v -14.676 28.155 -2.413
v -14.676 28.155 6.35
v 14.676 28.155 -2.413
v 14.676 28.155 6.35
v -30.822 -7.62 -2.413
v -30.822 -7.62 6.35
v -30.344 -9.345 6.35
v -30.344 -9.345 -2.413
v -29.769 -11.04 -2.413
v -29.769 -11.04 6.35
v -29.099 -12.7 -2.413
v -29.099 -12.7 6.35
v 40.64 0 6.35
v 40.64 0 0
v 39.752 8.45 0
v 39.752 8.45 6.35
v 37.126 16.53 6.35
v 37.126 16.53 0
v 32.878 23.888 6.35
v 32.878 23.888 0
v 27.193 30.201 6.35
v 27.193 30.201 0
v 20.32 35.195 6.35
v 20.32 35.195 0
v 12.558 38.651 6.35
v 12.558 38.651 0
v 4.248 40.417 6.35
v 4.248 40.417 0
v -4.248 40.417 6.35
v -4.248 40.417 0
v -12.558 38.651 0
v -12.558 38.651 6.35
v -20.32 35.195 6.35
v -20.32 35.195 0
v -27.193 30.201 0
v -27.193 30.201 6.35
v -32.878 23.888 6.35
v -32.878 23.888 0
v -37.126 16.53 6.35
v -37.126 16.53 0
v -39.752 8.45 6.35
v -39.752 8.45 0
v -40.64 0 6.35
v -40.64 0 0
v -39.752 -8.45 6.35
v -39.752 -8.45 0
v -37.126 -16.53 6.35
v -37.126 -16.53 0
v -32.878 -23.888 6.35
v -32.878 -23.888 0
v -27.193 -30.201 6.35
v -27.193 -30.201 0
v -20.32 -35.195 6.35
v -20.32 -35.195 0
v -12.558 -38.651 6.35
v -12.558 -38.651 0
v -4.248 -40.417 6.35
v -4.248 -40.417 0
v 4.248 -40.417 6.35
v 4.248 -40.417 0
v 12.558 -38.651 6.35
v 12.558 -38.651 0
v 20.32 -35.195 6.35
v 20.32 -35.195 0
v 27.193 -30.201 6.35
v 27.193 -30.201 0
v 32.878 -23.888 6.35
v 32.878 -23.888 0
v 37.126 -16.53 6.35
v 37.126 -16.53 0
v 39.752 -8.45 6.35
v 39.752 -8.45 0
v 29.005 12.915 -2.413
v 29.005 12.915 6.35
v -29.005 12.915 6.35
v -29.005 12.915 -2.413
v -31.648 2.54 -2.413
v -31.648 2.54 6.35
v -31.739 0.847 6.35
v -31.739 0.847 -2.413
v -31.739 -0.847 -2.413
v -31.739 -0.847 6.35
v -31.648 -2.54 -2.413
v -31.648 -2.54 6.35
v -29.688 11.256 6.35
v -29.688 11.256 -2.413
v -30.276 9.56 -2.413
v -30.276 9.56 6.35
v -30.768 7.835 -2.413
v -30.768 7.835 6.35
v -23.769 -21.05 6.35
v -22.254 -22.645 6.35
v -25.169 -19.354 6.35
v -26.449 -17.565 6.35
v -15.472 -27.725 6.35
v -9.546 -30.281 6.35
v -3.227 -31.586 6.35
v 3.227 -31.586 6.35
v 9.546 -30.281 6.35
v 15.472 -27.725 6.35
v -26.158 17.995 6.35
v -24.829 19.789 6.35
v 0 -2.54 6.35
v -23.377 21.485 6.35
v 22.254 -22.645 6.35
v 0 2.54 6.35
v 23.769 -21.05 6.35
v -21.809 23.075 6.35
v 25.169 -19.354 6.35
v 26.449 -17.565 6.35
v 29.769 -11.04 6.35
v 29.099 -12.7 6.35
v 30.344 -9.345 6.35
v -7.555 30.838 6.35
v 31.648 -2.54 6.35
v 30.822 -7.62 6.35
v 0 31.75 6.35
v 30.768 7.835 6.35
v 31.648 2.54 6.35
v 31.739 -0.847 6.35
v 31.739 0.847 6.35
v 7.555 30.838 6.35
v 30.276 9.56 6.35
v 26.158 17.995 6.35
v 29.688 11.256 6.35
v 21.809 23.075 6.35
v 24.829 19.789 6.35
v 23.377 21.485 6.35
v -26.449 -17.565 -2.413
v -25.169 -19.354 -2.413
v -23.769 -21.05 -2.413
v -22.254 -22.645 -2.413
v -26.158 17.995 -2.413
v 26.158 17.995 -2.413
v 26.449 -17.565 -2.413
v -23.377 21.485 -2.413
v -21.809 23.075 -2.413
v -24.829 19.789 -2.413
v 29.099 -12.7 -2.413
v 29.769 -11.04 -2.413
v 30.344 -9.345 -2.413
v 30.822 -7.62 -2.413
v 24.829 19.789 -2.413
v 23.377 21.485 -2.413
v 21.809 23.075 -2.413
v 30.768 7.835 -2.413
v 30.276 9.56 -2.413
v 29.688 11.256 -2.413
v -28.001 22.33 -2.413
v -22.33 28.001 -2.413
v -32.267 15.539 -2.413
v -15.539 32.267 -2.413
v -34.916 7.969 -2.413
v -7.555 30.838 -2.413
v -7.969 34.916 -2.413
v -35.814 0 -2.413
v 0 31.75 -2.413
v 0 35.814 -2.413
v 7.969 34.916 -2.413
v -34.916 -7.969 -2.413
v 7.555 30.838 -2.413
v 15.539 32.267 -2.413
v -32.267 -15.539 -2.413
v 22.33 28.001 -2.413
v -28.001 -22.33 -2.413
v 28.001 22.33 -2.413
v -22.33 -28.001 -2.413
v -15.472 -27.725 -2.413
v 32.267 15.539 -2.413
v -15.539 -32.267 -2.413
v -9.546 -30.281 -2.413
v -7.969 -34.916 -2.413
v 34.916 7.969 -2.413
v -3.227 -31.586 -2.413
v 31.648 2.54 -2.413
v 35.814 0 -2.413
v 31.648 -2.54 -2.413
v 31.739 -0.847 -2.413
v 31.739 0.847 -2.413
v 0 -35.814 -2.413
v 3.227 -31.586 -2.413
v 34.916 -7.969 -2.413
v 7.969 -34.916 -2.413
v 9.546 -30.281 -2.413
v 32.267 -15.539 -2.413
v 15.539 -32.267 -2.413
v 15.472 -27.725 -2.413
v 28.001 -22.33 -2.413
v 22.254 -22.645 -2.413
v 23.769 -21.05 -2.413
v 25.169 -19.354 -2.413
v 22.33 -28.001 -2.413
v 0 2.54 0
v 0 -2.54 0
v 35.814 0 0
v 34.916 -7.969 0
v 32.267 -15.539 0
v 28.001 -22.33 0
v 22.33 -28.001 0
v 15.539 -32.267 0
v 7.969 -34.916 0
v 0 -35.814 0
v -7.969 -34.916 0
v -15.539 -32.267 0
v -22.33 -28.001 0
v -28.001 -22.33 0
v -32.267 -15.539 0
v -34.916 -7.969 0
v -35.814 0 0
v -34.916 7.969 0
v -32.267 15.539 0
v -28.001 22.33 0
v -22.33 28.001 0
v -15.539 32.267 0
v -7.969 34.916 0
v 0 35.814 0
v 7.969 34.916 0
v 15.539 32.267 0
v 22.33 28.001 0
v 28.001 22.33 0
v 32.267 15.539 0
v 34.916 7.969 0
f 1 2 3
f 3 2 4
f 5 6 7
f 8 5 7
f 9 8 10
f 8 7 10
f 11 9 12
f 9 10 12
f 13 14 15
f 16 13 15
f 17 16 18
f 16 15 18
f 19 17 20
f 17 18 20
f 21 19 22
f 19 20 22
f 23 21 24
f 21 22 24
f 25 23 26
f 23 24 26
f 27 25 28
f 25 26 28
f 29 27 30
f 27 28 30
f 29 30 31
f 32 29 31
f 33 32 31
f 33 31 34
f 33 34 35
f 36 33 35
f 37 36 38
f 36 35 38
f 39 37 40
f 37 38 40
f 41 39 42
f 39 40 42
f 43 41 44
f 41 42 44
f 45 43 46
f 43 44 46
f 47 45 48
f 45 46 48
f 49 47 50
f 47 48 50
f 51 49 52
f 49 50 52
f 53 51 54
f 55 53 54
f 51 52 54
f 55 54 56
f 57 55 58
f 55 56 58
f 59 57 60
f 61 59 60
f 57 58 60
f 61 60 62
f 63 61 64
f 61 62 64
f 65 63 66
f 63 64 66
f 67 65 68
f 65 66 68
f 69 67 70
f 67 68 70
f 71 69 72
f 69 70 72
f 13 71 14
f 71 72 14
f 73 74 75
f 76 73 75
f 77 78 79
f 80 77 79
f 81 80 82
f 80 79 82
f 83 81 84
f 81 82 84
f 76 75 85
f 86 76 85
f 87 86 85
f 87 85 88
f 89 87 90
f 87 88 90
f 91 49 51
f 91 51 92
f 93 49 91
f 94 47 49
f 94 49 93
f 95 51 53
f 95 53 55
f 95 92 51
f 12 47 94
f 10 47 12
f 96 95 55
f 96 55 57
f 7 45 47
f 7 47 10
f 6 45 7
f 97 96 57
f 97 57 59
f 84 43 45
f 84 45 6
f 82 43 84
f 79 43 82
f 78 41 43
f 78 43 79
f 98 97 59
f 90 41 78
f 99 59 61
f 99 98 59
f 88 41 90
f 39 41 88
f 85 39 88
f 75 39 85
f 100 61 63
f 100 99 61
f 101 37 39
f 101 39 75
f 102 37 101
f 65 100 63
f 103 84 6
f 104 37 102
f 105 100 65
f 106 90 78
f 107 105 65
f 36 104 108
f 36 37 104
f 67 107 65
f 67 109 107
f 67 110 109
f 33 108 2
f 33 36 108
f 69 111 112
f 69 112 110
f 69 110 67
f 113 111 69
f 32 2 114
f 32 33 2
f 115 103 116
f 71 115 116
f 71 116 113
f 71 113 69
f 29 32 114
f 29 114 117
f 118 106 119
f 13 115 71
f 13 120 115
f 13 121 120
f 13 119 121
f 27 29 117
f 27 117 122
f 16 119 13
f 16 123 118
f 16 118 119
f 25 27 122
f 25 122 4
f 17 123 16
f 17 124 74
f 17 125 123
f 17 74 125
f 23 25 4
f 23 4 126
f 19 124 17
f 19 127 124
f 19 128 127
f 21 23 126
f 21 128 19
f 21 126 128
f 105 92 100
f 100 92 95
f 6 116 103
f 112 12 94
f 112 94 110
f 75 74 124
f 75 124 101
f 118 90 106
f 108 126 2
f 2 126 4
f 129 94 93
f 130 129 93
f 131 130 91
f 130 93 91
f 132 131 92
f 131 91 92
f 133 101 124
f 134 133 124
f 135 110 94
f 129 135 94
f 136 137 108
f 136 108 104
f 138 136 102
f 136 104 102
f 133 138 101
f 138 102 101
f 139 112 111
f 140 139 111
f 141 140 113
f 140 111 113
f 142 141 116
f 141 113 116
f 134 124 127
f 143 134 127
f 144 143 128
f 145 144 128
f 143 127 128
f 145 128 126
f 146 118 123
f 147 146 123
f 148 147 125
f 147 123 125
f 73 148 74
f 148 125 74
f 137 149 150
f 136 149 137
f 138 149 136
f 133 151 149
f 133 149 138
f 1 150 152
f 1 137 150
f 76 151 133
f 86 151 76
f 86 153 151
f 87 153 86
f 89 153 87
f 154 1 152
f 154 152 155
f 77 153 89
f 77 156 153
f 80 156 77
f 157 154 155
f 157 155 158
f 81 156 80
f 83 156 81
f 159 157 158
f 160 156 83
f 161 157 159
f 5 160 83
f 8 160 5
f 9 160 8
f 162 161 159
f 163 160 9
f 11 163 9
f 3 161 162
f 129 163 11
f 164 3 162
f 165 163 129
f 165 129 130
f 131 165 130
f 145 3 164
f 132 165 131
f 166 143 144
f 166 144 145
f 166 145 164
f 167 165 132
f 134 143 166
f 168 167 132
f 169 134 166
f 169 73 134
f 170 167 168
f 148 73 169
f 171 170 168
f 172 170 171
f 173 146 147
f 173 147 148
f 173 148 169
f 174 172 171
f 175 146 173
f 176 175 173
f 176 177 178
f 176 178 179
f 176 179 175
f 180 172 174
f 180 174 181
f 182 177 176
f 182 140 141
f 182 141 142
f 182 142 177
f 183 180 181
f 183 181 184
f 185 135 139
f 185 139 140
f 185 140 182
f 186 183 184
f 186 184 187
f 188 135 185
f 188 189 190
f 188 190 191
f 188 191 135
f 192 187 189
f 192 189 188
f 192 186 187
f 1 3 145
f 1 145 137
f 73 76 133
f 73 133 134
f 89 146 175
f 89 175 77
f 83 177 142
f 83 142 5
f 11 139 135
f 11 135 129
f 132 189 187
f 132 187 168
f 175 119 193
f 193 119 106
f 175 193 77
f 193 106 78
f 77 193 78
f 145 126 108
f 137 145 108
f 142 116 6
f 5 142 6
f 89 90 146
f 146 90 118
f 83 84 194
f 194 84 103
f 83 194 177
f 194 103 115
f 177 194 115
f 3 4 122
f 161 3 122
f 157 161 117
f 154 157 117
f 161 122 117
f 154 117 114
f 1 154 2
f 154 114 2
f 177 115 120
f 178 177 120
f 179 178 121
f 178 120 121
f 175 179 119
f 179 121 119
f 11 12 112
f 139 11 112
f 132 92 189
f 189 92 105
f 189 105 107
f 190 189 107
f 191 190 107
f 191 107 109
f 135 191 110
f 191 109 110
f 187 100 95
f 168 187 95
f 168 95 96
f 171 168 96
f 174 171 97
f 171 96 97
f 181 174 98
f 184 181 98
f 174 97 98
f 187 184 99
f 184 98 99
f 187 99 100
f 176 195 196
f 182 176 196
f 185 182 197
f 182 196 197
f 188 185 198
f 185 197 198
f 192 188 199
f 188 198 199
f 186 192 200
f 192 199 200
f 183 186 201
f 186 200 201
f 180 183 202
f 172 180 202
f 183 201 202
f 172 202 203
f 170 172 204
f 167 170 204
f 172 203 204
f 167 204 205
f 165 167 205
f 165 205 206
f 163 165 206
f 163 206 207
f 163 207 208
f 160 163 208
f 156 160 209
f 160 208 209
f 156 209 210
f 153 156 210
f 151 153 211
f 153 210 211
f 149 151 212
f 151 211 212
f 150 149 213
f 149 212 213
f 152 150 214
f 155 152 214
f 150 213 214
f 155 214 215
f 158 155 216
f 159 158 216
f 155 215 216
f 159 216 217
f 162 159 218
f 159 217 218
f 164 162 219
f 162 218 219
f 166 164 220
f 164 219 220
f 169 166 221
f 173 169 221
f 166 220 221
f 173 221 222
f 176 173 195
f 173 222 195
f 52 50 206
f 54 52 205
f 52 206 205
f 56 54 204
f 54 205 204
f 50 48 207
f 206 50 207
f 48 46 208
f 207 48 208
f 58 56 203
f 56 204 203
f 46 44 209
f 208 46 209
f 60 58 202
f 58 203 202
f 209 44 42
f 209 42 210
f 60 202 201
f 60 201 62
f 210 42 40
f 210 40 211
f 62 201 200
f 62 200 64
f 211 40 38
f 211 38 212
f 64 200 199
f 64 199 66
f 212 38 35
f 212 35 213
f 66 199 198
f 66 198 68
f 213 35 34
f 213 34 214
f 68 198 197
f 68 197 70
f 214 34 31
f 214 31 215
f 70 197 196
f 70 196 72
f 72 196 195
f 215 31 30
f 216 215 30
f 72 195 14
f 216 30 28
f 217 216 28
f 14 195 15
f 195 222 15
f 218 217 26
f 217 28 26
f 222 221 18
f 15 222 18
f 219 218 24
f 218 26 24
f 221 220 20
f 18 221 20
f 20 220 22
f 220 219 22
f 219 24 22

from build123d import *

# Parameters (mm, degrees)
F0_R     = 40.64
F0_R_2   = 2.54
F1_DEPTH = 6.35
F3_R     = 35.814
F4_DEPTH = 2.413
F5_DEPTH = 8.764


with BuildPart() as f1:
    # F0 (on Top) → F1 (new body)
    with BuildSketch(Plane.XY):
        Circle(F0_R)
        Circle(F0_R_2, mode=Mode.SUBTRACT)
    extrude(amount=F1_DEPTH)

    # F3 (on face) → F4 (join)
    with BuildSketch(Plane(origin=(0, 0, 0), x_dir=(1, 0, 0), z_dir=(0, 0, -1))):
        Circle(F3_R)
    extrude(amount=F4_DEPTH)

    # F2 (on face) → F5 (cut, through all)
    with BuildSketch(Plane.XY.offset(6.35)):
        with BuildLine():
            Line((-26.1582, 17.994751), (26.1582, 17.994751))
            ThreePointArc((26.1582, 17.994751), (24.117564, 20.649591), (21.808676, 23.074751))
            Line((21.808676, 23.074751), (-21.808676, 23.074751))
            ThreePointArc((-21.808676, 23.074751), (-24.117564, 20.649591), (-26.1582, 17.994751))
        make_face()
        with BuildLine():
            Line((0, 2.54), (-31.648237, 2.54))
            ThreePointArc((-31.648237, 2.54), (-31.75, 0), (-31.648237, -2.54))
            Line((-31.648237, -2.54), (31.648237, -2.54))
            ThreePointArc((31.648237, -2.54), (31.75, 0), (31.648237, 2.54))
            Line((31.648237, 2.54), (0, 2.54))
        make_face()
        with BuildLine():
            ThreePointArc((-29.004684, 12.914751), (-29.994159, 10.412152), (-30.768152, 7.834751))
            Line((-30.768152, 7.834751), (30.768152, 7.834751))
            ThreePointArc((30.768152, 7.834751), (29.994159, 10.412152), (29.004684, 12.914751))
            Line((29.004684, 12.914751), (-29.004684, 12.914751))
        make_face()
        with BuildLine():
            Line((-14.675575, 28.154751), (14.675575, 28.154751))
            ThreePointArc((14.675575, 28.154751), (0, 31.75), (-14.675575, 28.154751))
        make_face()
        with BuildLine():
            Line((30.822039, -7.62), (-30.822039, -7.62))
            ThreePointArc((-30.822039, -7.62), (-30.068172, -10.196446), (-29.099356, -12.7))
            Line((-29.099356, -12.7), (29.099356, -12.7))
            ThreePointArc((29.099356, -12.7), (30.068172, -10.196446), (30.822039, -7.62))
        make_face()
        with BuildLine():
            Line((26.448526, -17.565249), (-26.448526, -17.565249))
            ThreePointArc((-26.448526, -17.565249), (-24.483538, -20.214323), (-22.25433, -22.645249))
            Line((-22.25433, -22.645249), (22.25433, -22.645249))
            ThreePointArc((22.25433, -22.645249), (24.483538, -20.214323), (26.448526, -17.565249))
        make_face()
        with BuildLine():
            Line((15.471686, -27.725249), (-15.471686, -27.725249))
            ThreePointArc((-15.471686, -27.725249), (0, -31.75), (15.471686, -27.725249))
        make_face()
    extrude(amount=-F5_DEPTH, mode=Mode.SUBTRACT)


solid = f1.part
